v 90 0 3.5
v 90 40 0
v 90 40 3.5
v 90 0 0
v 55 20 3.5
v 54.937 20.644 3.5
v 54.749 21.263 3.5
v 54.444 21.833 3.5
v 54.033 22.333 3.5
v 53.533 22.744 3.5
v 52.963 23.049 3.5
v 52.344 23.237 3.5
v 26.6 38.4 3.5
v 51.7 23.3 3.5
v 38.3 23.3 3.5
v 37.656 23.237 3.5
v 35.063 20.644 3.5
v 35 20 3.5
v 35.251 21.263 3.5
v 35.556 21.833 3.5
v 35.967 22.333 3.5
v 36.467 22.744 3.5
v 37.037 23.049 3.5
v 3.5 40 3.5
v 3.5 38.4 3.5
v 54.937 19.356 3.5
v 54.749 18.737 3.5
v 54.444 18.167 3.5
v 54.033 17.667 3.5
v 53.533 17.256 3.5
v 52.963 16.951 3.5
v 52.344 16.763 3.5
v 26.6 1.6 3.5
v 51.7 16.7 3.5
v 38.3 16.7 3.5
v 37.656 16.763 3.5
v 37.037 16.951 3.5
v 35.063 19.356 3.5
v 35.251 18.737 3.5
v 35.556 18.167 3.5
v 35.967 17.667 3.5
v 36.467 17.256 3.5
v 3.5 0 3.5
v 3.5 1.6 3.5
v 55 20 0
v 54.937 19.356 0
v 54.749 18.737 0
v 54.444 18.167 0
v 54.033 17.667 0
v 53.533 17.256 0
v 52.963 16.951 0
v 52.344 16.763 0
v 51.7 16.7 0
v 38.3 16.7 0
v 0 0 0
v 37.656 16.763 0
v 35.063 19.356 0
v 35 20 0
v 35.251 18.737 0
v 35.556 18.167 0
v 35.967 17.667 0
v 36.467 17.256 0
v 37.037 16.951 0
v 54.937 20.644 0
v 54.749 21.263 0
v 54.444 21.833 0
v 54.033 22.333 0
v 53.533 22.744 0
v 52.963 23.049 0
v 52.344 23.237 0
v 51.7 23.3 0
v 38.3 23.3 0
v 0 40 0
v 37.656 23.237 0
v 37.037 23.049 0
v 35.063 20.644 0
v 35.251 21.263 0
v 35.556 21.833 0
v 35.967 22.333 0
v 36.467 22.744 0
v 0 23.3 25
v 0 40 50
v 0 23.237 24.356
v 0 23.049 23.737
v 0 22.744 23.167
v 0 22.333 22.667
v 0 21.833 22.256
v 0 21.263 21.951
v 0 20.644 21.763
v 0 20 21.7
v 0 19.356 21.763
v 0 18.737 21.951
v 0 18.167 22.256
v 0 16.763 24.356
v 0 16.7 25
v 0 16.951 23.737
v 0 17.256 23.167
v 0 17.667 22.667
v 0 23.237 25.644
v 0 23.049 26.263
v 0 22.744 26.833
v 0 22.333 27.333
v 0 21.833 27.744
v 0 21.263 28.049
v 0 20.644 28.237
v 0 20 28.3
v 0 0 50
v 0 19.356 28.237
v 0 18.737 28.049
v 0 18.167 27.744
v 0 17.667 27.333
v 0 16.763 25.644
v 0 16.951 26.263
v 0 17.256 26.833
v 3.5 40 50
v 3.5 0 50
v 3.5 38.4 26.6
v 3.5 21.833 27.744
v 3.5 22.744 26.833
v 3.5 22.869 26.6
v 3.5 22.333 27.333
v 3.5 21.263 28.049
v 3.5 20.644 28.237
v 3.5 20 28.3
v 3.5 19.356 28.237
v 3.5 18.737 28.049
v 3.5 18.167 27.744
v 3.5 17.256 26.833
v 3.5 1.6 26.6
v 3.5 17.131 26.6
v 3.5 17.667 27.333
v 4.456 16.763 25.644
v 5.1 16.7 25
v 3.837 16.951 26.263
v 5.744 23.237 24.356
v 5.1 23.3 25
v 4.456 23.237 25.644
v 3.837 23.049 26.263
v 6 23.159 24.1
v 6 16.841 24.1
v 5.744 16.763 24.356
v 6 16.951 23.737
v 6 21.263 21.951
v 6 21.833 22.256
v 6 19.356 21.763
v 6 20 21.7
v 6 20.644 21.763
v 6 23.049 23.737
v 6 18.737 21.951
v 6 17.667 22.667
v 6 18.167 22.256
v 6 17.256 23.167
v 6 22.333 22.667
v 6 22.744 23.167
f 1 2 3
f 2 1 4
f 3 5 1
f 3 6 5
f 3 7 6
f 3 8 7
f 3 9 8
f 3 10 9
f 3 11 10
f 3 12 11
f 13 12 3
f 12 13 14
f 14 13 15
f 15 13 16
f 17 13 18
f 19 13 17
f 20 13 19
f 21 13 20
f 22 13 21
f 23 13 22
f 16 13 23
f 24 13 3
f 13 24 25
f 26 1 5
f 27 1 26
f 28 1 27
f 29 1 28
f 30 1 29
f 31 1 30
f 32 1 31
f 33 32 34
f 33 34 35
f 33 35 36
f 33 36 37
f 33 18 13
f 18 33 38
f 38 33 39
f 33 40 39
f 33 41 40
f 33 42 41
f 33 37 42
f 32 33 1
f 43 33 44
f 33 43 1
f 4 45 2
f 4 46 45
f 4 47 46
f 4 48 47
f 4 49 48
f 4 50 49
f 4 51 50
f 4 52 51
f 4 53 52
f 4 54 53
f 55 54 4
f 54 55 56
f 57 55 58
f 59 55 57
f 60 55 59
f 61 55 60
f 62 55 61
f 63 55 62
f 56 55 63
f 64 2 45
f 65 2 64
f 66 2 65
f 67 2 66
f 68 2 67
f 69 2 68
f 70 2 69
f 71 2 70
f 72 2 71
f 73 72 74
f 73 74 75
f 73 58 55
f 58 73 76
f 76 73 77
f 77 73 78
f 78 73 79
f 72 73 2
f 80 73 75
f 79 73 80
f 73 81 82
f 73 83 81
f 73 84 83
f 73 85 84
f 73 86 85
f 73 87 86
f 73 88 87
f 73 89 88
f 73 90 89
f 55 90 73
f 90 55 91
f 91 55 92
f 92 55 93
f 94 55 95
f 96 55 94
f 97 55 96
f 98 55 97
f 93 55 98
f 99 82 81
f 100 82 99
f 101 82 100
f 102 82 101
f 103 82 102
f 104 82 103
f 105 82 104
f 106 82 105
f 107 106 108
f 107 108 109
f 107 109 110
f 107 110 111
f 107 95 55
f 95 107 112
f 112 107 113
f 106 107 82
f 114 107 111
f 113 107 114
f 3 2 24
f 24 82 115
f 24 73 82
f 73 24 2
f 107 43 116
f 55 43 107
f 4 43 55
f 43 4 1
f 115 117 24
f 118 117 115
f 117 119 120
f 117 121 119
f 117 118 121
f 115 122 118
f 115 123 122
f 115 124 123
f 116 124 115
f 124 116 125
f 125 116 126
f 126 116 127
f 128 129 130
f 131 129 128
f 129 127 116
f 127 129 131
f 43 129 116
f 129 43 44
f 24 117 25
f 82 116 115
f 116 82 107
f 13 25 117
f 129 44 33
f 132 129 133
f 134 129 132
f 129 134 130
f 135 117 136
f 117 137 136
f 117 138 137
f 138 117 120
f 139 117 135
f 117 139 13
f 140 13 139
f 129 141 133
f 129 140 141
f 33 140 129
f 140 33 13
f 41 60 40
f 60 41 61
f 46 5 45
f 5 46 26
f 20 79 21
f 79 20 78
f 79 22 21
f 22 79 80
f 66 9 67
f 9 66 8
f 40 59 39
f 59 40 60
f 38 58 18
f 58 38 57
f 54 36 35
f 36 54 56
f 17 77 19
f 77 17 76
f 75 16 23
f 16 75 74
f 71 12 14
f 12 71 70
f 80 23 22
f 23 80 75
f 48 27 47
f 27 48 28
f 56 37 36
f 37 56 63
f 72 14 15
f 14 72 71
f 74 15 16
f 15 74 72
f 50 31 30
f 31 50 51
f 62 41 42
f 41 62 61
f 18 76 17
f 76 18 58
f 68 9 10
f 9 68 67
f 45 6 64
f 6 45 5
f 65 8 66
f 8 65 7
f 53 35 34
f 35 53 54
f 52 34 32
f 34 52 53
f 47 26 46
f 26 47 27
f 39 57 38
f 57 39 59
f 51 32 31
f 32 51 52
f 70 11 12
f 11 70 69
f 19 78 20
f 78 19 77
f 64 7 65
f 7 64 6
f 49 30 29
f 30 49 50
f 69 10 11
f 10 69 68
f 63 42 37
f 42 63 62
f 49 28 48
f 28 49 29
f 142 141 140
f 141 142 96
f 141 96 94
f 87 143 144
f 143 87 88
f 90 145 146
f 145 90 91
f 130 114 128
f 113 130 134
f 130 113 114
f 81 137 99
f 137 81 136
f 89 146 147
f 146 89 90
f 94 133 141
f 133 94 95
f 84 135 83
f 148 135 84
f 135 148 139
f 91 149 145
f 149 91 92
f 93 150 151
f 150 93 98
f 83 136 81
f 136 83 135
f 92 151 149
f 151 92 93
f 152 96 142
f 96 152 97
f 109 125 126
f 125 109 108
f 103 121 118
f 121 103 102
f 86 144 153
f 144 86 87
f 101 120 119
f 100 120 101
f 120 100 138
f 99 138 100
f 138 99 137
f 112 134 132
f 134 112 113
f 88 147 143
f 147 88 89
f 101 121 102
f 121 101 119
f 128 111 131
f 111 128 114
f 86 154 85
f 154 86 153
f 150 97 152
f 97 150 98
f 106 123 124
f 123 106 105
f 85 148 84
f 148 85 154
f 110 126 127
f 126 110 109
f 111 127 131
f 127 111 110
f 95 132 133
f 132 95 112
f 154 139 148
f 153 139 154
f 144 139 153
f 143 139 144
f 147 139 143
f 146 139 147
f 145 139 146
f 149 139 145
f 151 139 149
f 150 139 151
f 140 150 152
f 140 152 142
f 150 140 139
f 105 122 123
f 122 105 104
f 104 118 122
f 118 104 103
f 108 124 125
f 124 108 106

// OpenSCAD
$fn = 32;

// ----------------------------------------------------------------------
// L-bracket: 90 x 40 x 50 mm
// ----------------------------------------------------------------------

// --- parameters (mm) ---
leg_a = 90;               // horizontal leg, X
leg_b = 50;               // vertical leg, Z
depth = 40;               // bracket depth, Y
thick = 3.5;              // plate thickness
hole_d = 6.6;             // clearance for M6
slot_l = 20;              // adjustment slot length
rib_leg = 28.5;           // gusset leg
rib_sink = 1.6;           // gusset overlap into the plates

module hole_z(px, py) {
  translate([px, py, -2.5]) cylinder(h = thick + 5, d = hole_d);
}
module hole_x(pz, py) {
  translate([-2.5, py, pz]) rotate([0, 90, 0]) cylinder(h = thick + 5, d = hole_d);
}
module adjust_slot(px, py) {
  hull() {
    translate([px - (slot_l - hole_d) / 2, py, -2.5]) cylinder(h = thick + 5, d = hole_d);
    translate([px + (slot_l - hole_d) / 2, py, -2.5]) cylinder(h = thick + 5, d = hole_d);
  }
}
module gusset() {
  translate([0, depth - rib_sink, 0])
    rotate([90, 0, 0])
      linear_extrude(height = depth - 2 * rib_sink)
        polygon(points = [[rib_sink, rib_sink], [rib_leg, rib_sink], [rib_sink, rib_leg]]);
}

difference() {
  union() {
    /* horizontal leg */
    cube([leg_a, depth, thick]);
    /* vertical leg, overlapping the corner block */
    cube([thick, depth, leg_b]);
    gusset();
  }
  adjust_slot(45, 20);
  hole_x(25, 20);
}
